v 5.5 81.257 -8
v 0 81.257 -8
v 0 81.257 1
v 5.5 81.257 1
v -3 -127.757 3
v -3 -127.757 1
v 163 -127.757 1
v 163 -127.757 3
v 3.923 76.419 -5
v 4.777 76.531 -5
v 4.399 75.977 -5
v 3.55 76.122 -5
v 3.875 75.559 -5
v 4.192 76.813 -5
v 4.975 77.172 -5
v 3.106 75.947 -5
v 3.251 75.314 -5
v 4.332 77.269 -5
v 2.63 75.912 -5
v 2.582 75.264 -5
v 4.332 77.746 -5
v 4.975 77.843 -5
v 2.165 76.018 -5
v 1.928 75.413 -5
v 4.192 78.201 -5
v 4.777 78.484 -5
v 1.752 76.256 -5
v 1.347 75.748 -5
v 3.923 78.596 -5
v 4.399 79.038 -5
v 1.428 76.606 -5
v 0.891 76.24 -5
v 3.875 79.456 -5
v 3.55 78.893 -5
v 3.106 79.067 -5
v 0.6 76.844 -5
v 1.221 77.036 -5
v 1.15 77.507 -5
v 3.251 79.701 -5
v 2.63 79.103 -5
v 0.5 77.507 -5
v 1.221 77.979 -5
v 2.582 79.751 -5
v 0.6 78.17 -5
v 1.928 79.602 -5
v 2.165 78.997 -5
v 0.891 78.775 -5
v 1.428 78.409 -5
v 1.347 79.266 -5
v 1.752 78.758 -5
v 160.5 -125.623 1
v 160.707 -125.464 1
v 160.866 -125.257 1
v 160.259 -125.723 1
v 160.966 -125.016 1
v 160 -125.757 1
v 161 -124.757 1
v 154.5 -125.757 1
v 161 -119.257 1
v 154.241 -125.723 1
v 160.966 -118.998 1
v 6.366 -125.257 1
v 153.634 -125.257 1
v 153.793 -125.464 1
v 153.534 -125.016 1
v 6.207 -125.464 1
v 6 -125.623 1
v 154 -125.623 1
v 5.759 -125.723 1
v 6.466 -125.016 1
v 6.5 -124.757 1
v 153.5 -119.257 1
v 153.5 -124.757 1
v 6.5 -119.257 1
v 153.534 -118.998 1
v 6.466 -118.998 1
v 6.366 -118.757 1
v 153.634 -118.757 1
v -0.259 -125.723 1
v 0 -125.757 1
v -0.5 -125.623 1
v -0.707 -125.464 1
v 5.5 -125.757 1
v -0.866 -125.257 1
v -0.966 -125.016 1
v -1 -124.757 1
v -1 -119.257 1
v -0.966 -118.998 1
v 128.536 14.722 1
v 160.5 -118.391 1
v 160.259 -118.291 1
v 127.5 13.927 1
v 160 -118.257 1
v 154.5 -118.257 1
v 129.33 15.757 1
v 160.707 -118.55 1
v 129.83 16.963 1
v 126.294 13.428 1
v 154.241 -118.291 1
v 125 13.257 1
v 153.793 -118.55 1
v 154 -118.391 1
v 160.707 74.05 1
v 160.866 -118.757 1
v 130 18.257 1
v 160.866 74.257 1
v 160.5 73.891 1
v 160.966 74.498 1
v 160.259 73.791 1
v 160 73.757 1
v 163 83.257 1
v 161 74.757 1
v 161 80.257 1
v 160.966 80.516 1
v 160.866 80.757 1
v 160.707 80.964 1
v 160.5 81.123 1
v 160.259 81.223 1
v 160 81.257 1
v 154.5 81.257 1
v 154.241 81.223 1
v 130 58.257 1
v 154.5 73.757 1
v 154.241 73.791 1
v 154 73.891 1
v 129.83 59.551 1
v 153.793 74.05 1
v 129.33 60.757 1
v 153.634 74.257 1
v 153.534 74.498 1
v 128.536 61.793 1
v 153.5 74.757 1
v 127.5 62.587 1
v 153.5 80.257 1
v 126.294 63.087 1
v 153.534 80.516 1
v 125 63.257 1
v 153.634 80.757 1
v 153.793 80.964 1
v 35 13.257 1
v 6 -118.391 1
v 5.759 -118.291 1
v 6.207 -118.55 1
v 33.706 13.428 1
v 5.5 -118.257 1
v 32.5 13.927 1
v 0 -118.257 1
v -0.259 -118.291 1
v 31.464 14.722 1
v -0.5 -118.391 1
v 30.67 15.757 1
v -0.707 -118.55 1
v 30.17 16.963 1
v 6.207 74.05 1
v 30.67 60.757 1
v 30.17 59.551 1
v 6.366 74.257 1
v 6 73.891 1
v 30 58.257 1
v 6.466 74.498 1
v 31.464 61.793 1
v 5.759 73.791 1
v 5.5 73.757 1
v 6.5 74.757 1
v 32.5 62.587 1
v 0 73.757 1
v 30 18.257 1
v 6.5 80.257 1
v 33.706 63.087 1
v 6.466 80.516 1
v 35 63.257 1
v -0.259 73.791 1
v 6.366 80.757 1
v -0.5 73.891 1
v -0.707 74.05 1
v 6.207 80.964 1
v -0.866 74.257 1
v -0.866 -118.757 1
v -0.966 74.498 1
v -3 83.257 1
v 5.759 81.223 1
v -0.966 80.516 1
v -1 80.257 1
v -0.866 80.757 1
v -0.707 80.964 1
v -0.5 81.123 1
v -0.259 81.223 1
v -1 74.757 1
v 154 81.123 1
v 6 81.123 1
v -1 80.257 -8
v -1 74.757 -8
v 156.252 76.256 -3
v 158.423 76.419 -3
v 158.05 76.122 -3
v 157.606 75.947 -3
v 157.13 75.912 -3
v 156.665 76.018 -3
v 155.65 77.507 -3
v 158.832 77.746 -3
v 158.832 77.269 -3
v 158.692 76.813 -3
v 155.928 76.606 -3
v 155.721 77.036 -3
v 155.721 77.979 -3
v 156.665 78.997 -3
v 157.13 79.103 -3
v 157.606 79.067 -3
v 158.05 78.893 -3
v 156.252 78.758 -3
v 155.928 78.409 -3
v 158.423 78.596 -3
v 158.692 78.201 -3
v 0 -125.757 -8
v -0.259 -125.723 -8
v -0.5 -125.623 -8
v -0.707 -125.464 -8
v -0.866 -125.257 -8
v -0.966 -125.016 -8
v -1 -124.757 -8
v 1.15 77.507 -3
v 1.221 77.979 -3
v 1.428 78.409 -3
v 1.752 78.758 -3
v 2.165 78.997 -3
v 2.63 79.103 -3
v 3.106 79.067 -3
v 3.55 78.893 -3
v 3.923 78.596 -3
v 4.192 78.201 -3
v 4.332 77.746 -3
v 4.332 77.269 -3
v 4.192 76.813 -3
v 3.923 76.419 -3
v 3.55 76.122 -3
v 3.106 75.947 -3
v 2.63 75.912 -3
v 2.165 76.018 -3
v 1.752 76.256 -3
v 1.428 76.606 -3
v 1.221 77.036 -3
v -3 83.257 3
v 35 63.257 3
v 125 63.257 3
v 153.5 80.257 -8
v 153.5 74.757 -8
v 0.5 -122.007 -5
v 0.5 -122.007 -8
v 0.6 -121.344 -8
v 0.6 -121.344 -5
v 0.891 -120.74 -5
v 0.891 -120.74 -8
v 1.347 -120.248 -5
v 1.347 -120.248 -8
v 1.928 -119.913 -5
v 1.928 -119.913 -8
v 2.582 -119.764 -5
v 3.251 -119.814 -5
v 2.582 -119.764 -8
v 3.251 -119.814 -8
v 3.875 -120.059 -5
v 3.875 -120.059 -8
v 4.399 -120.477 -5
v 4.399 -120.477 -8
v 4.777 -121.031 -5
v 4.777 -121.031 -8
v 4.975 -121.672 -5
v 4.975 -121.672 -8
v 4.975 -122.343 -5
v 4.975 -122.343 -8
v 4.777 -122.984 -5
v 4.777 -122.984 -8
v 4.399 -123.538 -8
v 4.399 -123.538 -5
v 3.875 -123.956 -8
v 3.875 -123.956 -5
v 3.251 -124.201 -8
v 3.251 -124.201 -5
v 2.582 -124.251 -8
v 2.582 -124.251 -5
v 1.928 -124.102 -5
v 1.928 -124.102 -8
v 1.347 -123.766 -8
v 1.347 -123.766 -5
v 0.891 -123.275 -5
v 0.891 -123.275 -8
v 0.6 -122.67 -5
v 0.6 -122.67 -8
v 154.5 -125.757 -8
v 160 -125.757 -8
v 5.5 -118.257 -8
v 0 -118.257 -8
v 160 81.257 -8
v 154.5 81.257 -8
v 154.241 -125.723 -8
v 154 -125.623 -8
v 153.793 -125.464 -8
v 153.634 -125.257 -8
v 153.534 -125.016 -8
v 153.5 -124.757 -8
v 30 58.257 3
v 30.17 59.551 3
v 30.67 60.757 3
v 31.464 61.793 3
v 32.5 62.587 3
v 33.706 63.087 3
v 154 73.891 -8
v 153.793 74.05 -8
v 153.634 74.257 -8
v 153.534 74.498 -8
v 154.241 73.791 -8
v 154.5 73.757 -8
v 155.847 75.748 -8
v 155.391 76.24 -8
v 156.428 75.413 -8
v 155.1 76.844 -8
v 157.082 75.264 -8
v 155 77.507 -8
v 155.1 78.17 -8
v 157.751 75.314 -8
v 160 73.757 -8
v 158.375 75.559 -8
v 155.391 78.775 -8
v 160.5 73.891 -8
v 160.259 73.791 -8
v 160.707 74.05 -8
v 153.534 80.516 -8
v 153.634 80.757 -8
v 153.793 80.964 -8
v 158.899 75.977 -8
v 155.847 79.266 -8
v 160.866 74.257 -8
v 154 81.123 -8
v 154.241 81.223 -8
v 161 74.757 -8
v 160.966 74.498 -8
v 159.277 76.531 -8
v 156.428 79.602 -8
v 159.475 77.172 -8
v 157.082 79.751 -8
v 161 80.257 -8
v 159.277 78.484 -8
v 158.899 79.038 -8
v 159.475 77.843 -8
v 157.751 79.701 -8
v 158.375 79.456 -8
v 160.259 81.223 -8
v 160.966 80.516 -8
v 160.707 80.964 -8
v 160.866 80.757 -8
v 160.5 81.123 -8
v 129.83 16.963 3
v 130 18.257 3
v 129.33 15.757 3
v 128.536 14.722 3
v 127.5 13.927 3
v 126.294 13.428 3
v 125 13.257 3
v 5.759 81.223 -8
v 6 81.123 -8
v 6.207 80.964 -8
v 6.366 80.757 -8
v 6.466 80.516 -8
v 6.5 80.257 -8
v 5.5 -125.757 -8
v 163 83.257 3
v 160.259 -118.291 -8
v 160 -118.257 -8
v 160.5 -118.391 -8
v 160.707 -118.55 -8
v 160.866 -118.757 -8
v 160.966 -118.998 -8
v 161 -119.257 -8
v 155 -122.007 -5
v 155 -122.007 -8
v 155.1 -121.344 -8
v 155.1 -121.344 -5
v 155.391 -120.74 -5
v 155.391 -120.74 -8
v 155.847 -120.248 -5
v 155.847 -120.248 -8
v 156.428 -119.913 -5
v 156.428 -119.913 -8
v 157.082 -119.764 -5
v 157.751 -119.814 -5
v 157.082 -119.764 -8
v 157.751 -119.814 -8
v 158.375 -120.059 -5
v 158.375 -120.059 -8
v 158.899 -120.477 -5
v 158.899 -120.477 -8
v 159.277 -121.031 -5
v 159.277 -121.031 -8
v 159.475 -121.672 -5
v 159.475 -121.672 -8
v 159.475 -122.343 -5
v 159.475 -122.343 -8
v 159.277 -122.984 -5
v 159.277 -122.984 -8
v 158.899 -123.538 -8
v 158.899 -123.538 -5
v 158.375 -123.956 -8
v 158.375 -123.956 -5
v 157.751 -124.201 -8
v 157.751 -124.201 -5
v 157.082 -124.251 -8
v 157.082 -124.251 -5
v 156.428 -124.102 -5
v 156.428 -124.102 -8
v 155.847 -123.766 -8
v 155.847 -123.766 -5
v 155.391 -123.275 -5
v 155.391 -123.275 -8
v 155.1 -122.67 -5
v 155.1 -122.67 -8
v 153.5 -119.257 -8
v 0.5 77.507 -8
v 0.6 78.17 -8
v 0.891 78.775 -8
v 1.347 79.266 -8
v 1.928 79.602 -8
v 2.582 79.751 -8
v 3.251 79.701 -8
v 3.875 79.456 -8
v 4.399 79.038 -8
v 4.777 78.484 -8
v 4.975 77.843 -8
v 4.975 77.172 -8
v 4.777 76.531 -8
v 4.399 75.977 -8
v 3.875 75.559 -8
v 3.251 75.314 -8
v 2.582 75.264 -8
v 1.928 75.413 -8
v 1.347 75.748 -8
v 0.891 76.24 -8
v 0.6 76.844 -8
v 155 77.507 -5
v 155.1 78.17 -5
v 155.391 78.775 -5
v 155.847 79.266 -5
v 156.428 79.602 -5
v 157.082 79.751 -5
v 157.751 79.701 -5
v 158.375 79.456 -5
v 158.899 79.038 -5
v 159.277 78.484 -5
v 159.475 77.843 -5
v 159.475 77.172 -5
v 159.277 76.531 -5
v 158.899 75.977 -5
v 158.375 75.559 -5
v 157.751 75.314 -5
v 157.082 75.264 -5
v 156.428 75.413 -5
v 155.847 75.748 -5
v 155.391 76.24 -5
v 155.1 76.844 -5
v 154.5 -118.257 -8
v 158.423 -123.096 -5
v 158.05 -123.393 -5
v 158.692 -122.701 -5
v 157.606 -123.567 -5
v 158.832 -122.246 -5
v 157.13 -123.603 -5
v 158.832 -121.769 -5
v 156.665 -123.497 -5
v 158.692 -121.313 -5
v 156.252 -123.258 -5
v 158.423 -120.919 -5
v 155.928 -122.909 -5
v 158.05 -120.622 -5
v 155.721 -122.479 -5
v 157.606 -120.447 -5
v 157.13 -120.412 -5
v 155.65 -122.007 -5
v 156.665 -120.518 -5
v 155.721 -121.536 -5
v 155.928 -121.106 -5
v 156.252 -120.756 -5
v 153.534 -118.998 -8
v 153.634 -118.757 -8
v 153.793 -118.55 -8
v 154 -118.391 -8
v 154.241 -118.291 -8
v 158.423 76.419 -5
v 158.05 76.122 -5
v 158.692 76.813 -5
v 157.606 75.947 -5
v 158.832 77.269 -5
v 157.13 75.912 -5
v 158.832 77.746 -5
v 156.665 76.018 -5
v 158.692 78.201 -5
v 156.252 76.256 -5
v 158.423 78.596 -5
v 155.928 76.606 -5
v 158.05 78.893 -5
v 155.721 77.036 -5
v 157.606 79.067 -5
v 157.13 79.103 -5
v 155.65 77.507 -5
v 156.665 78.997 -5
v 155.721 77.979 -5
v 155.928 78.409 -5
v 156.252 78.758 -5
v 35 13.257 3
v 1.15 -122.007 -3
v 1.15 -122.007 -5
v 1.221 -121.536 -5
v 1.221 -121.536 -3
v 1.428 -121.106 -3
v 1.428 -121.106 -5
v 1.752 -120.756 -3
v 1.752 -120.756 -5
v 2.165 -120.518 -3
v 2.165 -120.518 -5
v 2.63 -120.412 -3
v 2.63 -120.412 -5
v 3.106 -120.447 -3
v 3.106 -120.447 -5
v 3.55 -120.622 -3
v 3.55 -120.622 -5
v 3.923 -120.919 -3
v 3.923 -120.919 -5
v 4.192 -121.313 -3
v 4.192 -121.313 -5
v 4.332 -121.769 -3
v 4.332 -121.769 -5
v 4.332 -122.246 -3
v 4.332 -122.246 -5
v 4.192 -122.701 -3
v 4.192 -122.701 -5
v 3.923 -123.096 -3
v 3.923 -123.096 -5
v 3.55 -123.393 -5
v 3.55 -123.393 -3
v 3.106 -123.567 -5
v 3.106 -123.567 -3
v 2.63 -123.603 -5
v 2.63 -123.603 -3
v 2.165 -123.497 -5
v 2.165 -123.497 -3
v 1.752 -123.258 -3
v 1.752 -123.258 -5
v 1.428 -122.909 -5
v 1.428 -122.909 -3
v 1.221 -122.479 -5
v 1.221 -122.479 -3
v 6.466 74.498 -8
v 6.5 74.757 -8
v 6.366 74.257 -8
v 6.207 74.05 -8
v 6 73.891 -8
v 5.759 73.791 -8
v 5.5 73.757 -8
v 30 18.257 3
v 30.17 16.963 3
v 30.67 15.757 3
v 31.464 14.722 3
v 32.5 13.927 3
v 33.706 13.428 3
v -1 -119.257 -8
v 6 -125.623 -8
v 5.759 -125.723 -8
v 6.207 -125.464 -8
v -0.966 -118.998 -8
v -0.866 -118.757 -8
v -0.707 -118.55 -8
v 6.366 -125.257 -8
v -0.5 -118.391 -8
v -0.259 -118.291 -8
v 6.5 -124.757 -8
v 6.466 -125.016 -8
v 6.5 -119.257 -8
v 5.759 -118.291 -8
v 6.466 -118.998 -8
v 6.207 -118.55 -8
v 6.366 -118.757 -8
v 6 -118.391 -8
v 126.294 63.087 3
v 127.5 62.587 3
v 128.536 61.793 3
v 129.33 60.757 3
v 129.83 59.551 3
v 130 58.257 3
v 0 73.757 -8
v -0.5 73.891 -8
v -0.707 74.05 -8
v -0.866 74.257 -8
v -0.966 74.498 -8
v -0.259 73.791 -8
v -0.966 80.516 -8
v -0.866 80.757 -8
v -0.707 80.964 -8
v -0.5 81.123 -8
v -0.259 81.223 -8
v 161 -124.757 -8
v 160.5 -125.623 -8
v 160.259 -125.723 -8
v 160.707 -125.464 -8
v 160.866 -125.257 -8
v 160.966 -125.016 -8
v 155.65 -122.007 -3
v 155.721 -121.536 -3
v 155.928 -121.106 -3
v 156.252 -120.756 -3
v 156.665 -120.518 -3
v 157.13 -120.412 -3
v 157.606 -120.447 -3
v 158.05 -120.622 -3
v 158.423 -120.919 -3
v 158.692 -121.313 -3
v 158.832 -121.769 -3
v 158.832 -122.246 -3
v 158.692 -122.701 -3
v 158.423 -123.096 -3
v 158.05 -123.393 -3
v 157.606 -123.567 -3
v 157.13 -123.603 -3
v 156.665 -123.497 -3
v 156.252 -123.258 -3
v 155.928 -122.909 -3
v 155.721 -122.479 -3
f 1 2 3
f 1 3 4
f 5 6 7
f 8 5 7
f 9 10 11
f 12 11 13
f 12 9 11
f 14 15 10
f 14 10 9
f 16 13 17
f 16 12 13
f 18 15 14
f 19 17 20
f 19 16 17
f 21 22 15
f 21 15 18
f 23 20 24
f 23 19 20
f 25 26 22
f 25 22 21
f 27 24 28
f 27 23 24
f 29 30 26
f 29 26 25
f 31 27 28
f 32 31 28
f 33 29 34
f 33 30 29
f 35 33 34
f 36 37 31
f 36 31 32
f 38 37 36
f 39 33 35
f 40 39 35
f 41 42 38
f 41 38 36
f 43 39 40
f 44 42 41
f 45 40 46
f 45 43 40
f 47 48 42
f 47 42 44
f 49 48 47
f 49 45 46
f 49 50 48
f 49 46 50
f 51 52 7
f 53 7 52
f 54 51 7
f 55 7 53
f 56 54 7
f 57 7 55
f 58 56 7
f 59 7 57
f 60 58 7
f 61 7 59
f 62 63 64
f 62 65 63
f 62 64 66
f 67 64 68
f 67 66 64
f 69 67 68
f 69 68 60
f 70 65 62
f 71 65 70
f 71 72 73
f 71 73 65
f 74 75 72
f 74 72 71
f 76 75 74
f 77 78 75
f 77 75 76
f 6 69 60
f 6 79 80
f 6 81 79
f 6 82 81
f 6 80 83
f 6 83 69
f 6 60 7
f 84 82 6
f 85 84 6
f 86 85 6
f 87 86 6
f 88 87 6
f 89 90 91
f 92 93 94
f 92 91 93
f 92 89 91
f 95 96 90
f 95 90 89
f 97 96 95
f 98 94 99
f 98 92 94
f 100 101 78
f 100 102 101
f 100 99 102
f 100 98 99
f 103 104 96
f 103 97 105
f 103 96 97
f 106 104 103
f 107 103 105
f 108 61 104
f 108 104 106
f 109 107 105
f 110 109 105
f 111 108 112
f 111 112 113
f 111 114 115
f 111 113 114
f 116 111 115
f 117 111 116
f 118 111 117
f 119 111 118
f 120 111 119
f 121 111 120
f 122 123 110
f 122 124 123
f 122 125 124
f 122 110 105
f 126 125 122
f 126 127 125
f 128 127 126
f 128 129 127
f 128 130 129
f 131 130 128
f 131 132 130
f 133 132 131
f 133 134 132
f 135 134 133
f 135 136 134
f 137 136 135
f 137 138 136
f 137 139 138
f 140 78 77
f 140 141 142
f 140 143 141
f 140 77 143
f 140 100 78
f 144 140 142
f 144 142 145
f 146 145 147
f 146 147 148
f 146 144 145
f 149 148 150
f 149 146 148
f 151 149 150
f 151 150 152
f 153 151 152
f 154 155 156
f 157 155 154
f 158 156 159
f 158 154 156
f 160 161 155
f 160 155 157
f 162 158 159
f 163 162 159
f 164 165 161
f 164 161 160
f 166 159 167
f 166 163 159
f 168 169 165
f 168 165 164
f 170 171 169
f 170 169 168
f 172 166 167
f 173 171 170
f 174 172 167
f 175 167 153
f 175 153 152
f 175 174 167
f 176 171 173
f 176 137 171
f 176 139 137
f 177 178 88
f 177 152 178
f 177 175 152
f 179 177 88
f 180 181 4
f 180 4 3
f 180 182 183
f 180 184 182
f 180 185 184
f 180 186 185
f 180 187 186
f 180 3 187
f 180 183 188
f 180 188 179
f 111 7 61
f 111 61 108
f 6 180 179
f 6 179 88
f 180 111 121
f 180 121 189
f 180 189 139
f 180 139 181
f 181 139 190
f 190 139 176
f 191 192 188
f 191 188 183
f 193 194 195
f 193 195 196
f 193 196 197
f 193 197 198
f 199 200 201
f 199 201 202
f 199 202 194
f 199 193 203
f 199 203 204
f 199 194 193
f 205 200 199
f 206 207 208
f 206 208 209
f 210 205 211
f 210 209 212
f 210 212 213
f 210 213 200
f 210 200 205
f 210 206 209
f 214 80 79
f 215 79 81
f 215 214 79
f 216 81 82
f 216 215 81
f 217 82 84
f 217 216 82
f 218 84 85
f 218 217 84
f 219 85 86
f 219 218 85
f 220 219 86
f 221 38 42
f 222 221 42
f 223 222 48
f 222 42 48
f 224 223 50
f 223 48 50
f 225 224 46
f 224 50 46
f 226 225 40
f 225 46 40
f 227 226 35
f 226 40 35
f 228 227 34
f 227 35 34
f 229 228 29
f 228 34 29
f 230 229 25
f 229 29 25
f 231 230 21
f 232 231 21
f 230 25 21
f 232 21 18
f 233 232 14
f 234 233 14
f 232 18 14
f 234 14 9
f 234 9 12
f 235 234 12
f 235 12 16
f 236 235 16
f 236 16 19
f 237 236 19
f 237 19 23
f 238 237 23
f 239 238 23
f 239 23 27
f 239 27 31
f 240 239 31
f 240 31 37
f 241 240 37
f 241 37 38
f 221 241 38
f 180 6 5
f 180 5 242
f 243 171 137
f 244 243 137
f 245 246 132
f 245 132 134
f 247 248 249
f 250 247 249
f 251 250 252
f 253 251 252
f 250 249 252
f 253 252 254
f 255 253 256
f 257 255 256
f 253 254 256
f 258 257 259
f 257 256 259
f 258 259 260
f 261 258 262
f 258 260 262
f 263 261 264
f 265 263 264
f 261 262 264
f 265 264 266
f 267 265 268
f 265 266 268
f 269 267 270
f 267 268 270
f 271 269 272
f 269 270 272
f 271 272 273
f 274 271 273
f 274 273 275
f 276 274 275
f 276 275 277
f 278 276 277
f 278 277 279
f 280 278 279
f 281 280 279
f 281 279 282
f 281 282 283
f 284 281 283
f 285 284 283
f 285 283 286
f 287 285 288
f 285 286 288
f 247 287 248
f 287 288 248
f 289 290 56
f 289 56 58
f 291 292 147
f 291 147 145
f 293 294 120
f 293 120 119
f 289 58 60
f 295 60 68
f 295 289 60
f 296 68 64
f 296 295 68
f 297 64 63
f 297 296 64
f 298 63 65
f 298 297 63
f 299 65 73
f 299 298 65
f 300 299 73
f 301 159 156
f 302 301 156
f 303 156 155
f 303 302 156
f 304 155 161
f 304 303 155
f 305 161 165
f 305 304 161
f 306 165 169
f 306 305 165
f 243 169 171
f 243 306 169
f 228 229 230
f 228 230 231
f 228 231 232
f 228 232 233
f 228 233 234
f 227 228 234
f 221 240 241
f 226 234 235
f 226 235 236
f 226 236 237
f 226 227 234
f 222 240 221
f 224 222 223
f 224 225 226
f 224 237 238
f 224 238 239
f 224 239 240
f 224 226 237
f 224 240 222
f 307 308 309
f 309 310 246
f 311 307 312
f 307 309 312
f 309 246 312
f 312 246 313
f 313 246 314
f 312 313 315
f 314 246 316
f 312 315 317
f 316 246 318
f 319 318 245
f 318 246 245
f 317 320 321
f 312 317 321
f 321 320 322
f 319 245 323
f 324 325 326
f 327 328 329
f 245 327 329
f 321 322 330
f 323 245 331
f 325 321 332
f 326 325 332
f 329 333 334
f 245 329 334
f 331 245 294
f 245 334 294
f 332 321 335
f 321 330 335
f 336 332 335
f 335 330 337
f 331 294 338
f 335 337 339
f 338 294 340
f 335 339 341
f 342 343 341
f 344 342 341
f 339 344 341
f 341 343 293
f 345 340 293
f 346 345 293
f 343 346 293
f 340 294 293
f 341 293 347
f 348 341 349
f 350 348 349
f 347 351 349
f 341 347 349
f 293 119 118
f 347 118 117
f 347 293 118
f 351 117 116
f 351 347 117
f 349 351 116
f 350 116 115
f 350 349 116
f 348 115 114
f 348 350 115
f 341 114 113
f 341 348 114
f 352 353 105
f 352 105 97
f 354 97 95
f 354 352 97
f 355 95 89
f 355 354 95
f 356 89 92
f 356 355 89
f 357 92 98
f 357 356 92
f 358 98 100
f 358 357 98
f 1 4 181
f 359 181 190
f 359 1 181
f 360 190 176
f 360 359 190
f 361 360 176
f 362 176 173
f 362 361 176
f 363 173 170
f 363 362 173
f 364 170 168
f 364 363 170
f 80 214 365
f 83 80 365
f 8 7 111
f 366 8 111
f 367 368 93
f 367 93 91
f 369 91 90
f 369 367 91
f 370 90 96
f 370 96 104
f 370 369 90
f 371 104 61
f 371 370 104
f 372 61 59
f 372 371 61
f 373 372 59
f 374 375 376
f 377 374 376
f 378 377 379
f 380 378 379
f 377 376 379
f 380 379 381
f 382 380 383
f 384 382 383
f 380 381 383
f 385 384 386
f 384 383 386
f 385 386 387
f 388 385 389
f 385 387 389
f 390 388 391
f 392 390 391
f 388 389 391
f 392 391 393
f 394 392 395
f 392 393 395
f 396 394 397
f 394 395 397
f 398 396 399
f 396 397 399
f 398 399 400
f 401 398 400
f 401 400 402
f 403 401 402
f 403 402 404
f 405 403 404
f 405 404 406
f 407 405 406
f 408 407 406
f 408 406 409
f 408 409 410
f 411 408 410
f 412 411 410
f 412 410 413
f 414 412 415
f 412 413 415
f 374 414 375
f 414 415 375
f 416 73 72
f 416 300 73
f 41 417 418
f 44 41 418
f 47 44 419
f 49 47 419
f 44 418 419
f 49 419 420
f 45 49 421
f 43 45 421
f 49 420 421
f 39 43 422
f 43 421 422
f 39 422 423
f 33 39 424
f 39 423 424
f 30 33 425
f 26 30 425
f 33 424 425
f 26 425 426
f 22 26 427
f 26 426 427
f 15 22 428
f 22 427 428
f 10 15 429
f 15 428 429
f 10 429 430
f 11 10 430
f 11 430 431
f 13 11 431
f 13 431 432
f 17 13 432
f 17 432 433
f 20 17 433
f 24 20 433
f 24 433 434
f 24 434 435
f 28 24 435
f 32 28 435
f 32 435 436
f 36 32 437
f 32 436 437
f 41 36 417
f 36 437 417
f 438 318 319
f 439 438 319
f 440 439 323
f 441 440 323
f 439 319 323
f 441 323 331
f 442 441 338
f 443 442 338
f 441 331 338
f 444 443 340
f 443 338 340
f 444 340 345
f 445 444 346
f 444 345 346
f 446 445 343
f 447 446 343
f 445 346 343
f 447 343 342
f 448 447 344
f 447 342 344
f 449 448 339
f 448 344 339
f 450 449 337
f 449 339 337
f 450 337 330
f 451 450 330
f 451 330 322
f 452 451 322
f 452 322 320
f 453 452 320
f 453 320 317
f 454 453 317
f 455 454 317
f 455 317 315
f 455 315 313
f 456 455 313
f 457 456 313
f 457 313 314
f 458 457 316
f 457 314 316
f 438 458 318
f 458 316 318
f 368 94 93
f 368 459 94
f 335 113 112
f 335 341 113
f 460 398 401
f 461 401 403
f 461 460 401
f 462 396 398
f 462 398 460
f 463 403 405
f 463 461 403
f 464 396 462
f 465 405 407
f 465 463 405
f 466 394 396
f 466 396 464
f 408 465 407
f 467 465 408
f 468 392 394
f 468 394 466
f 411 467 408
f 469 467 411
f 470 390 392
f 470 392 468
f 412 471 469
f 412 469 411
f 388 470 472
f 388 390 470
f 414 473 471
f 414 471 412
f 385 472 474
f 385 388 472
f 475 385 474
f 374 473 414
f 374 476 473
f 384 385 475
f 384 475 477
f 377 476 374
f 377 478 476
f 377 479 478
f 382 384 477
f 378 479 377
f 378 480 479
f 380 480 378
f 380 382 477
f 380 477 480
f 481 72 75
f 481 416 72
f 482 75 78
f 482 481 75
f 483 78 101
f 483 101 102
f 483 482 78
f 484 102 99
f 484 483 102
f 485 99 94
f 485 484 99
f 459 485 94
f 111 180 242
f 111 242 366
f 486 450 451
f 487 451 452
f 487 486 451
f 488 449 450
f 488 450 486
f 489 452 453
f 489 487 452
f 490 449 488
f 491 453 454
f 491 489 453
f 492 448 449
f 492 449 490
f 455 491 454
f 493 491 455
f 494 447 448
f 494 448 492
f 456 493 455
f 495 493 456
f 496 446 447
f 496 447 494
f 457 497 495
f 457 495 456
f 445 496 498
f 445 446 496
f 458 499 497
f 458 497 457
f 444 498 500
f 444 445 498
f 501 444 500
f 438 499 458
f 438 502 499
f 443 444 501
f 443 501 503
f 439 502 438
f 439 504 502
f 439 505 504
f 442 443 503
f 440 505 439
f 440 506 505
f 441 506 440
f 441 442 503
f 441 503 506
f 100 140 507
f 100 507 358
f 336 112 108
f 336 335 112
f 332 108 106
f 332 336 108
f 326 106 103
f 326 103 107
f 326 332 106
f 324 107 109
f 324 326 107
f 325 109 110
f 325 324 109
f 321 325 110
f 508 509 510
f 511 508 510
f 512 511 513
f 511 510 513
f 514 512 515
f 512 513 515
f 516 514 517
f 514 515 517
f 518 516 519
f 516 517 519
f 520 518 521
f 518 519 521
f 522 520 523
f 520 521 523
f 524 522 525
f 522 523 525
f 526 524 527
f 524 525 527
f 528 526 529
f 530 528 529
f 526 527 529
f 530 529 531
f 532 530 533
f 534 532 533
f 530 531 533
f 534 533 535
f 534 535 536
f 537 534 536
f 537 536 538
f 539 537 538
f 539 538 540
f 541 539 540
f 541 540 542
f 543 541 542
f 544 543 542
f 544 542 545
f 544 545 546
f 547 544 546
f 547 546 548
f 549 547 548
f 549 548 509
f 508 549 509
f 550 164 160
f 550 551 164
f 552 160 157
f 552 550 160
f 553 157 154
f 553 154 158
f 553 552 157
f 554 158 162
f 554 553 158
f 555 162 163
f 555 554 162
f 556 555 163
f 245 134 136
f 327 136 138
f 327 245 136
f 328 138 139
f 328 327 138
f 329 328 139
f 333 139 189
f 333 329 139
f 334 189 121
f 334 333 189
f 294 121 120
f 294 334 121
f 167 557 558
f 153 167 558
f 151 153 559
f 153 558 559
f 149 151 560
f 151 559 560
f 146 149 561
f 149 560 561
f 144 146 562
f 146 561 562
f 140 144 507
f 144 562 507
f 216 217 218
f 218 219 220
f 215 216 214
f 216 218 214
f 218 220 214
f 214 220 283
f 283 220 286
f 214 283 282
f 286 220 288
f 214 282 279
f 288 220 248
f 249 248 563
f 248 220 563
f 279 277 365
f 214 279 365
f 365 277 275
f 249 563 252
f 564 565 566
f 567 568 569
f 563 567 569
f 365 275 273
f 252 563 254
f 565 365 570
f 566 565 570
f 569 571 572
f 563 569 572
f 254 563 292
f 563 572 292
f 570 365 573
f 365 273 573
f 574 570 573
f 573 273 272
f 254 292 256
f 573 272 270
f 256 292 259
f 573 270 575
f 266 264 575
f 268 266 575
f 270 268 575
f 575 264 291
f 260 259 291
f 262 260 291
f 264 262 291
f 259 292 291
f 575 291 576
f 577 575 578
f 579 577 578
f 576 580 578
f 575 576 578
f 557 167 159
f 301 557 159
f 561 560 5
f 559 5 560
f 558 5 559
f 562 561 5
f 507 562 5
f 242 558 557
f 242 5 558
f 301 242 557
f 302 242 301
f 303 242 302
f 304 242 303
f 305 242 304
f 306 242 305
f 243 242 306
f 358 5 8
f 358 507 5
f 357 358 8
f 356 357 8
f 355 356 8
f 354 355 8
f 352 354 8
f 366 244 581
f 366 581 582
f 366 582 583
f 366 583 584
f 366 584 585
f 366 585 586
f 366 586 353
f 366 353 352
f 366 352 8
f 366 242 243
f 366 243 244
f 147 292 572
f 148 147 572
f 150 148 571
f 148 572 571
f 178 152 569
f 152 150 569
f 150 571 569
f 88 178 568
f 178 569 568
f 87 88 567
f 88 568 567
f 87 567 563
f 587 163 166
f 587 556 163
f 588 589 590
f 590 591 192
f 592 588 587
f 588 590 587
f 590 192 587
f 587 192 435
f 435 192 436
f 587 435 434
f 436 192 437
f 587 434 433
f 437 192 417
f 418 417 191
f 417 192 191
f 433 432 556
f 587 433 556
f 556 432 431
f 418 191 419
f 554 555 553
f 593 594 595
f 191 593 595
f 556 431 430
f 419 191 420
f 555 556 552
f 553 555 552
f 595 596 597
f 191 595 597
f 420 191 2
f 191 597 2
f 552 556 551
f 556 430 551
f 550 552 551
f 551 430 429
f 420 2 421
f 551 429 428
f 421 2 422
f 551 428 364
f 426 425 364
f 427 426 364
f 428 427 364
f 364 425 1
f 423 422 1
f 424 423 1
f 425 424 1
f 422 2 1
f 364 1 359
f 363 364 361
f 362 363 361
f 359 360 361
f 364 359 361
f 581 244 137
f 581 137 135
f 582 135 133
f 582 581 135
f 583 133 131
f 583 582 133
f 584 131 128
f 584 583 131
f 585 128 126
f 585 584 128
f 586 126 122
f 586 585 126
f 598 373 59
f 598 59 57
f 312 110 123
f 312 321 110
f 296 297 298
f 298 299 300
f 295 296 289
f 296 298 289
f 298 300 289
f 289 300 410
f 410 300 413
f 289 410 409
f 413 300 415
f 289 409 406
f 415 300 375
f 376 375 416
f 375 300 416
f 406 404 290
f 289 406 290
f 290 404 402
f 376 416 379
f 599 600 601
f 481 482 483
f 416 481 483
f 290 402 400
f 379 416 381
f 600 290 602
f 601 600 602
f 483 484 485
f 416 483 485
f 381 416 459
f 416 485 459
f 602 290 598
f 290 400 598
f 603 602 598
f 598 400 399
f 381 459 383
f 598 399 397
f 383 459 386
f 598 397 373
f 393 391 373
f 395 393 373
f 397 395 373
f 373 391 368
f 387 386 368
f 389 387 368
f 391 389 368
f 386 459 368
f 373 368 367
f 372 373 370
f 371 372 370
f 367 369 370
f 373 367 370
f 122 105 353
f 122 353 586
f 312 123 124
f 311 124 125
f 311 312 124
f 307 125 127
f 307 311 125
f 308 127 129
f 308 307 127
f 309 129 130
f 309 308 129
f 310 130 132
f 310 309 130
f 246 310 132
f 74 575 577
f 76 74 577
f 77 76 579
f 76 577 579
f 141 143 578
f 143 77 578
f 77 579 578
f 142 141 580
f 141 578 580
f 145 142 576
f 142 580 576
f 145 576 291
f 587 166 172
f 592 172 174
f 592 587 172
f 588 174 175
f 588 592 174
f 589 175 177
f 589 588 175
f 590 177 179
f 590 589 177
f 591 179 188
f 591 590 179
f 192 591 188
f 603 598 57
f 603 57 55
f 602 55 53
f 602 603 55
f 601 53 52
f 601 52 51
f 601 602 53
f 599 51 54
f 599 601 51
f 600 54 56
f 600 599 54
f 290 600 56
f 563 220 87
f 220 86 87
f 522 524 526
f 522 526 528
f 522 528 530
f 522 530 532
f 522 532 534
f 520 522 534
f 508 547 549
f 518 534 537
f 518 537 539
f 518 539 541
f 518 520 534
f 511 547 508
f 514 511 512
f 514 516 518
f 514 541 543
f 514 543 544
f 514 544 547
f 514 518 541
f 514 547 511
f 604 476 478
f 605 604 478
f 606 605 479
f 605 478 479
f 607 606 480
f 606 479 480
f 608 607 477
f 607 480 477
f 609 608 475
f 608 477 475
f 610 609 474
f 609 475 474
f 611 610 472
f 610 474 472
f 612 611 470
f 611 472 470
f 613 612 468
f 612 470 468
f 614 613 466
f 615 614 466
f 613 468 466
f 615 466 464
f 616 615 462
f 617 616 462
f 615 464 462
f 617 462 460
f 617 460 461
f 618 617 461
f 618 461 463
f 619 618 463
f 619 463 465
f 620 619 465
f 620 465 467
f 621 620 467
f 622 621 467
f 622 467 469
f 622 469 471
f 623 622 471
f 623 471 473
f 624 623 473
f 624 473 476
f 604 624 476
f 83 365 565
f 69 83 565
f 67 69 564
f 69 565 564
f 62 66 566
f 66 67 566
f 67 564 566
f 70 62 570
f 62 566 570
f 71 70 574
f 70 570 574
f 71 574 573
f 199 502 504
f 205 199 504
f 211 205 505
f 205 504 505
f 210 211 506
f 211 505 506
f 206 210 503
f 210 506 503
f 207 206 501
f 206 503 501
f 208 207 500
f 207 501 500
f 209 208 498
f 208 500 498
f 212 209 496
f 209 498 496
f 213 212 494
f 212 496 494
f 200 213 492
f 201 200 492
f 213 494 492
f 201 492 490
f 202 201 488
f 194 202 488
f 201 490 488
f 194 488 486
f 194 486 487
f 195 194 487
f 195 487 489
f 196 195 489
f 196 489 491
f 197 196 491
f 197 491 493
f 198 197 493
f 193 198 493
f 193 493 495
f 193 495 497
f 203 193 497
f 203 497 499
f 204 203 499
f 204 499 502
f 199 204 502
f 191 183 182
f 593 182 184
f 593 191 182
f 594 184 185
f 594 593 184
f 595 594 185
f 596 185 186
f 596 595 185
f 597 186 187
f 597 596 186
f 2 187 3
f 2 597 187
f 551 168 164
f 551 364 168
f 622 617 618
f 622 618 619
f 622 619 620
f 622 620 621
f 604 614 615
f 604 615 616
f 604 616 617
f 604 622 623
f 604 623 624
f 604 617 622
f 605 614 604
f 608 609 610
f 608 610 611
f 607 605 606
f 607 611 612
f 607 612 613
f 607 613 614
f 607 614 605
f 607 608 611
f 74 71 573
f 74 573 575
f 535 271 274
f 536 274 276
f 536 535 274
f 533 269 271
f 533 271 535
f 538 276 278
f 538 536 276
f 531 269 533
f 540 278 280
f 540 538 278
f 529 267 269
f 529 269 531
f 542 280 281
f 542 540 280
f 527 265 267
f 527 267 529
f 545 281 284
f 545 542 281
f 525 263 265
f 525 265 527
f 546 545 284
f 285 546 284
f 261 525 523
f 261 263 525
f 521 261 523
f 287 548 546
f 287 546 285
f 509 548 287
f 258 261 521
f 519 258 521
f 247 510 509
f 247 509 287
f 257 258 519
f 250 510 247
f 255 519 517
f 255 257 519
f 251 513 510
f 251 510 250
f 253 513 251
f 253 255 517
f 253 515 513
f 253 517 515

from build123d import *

# Parameters (mm, degrees)
BOSS_EXTRUDE1_DEPTH = 3
SKETCH2_W           = 166
SKETCH2_H           = 211.014567036
SKETCH2_W_2         = 100
SKETCH2_H_2         = 50
BOSS_EXTRUDE2_DEPTH = 3
CUT_EXTRUDE1_DEPTH  = 3
FILLET1_R           = 5
SKETCH4_W           = 7.5
SKETCH4_H           = 7.5
BOSS_EXTRUDE3_DEPTH = 11
FILLET2_R           = 1
SKETCH5_R           = 1.6
CUT_EXTRUDE2_DEPTH  = 5
SKETCH6_R           = 2.25
CUT_EXTRUDE3_DEPTH  = 3
SKETCH7_W           = 166
SKETCH7_H           = 211.014567036
CUT_EXTRUDE4_DEPTH  = 1


with BuildPart() as part:
    # Sketch1 → Boss-Extrude1 (new body)
    with BuildSketch(Plane.XY):
        with BuildLine():
            Line((48, 73.257283518), (48, -16.742716482))
            ThreePointArc((48, -16.742716482), (50.050252532, -21.69246395), (55, -23.742716482))
            Line((55, -23.742716482), (105, -23.742716482))
            ThreePointArc((105, -23.742716482), (109.949747468, -21.69246395), (112, -16.742716482))
            Line((112, -16.742716482), (112, 73.257283518))
            ThreePointArc((112, 73.257283518), (109.949747468, 78.207030987), (105, 80.257283518))
            Line((105, 80.257283518), (55, 80.257283518))
            ThreePointArc((55, 80.257283518), (50.050252532, 78.207030987), (48, 73.257283518))
        make_face()
        with BuildLine():
            Line((53, 73.257283518), (53, -16.742716482))
            ThreePointArc((53, -16.742716482), (53.585786438, -18.156930044), (55, -18.742716482))
            Line((55, -18.742716482), (105, -18.742716482))
            ThreePointArc((105, -18.742716482), (106.414213562, -18.156930044), (107, -16.742716482))
            Line((107, -16.742716482), (107, 73.257283518))
            ThreePointArc((107, 73.257283518), (106.414213562, 74.671497081), (105, 75.257283518))
            Line((105, 75.257283518), (55, 75.257283518))
            ThreePointArc((55, 75.257283518), (53.585786438, 74.671497081), (53, 73.257283518))
        make_face(mode=Mode.SUBTRACT)
    extrude(amount=-BOSS_EXTRUDE1_DEPTH)

    # Sketch2 → Boss-Extrude2 (add)
    with BuildSketch(Plane.XY):
        with Locations((80, -22.25)):
            Rectangle(SKETCH2_W, SKETCH2_H)
        with Locations((80, 38.257283518)):
            Rectangle(SKETCH2_W_2, SKETCH2_H_2, mode=Mode.SUBTRACT)
    extrude(amount=BOSS_EXTRUDE2_DEPTH)

    # Sketch3 → Cut-Extrude1 (cut)
    with BuildSketch(Plane(origin=(0, 0, -3), x_dir=(-1, 0, 0), z_dir=(0, 0, -1))):
        with BuildLine():
            Line((-55, 80.257283518), (-105, 80.257283518))
            ThreePointArc((-105, 80.257283518), (-109.949747468, 78.207030987), (-112, 73.257283518))
            Line((-112, 73.257283518), (-112, -16.742716482))
            ThreePointArc((-112, -16.742716482), (-109.949747468, -21.69246395), (-105, -23.742716482))
            Line((-105, -23.742716482), (-55, -23.742716482))
            ThreePointArc((-55, -23.742716482), (-50.050252532, -21.69246395), (-48, -16.742716482))
            Line((-48, -16.742716482), (-48, 73.257283518))
            ThreePointArc((-48, 73.257283518), (-50.050252532, 78.207030987), (-55, 80.257283518))
        make_face()
    extrude(amount=-CUT_EXTRUDE1_DEPTH, mode=Mode.SUBTRACT)

    # Fillet1
    fillet1_edges = [part.edges().sort_by_distance(p)[0] for p in [
        (30, 13.257283518, 1.5),
        (130, 13.257283518, 1.5),
        (130, 63.257283518, 1.5),
        (30, 63.257283518, 1.5),
    ]]
    fillet(fillet1_edges, radius=FILLET1_R)

    # Sketch4 → Boss-Extrude3 (add)
    with BuildSketch(Plane.XY.offset(3)):
        with Locations((2.75, 77.507283518)):
            Rectangle(SKETCH4_W, SKETCH4_H)
        with Locations((157.25, -122.007283518)):
            Rectangle(SKETCH4_W, SKETCH4_H)
        with Locations((2.75, -122.007283518)):
            Rectangle(SKETCH4_W, SKETCH4_H)
        with Locations((157.25, 77.507283518)):
            Rectangle(SKETCH4_W, SKETCH4_H)
    extrude(amount=-BOSS_EXTRUDE3_DEPTH)

    # Fillet2
    fillet2_edges = [part.edges().sort_by_distance(p)[0] for p in [
        (-1, 73.757283518, -4),
        (-1, 81.257283518, -4),
        (6.5, 81.257283518, -4),
        (6.5, 73.757283518, -4),
        (161, -118.257283518, -4),
        (161, -125.757283518, -4),
        (153.5, -125.757283518, -4),
        (153.5, -118.257283518, -4),
        (-1, -125.757283518, -4),
        (-1, -118.257283518, -4),
        (6.5, -118.257283518, -4),
        (6.5, -125.757283518, -4),
        (161, 81.257283518, -4),
        (161, 73.757283518, -4),
        (153.5, 73.757283518, -4),
        (153.5, 81.257283518, -4),
    ]]
    fillet(fillet2_edges, radius=FILLET2_R)

    # Sketch5 → Cut-Extrude2 (cut)
    with BuildSketch(Plane(origin=(0, 0, -8), x_dir=(-1, 0, 0), z_dir=(0, 0, -1))):
        with Locations((-157.25, 77.507283518)):
            Circle(SKETCH5_R)
        with Locations((-2.75, 77.507283518)):
            Circle(SKETCH5_R)
        with Locations((-2.75, -122.007283518)):
            Circle(SKETCH5_R)
        with Locations((-157.25, -122.007283518)):
            Circle(SKETCH5_R)
    extrude(amount=-CUT_EXTRUDE2_DEPTH, mode=Mode.SUBTRACT)

    # Sketch6 → Cut-Extrude3 (cut)
    with BuildSketch(Plane(origin=(0, 0, -8), x_dir=(-1, 0, 0), z_dir=(0, 0, -1))):
        with Locations((-157.25, 77.507283518)):
            Circle(SKETCH6_R)
        with Locations((-2.75, 77.507283518)):
            Circle(SKETCH6_R)
        with Locations((-157.25, -122.007283518)):
            Circle(SKETCH6_R)
        with Locations((-2.75, -122.007283518)):
            Circle(SKETCH6_R)
    extrude(amount=-CUT_EXTRUDE3_DEPTH, mode=Mode.SUBTRACT)

    # Sketch7 → Cut-Extrude4 (cut)
    with BuildSketch(Plane(origin=(0, 0, 0), x_dir=(-1, 0, 0), z_dir=(0, 0, -1))):
        with Locations((-80, -22.25)):
            Rectangle(SKETCH7_W, SKETCH7_H)
        with BuildLine():
            Line((-160, 73.757283518), (-154.5, 73.757283518))
            ThreePointArc((-154.5, 73.757283518), (-153.792893219, 74.050176737), (-153.5, 74.757283518))
            Line((-153.5, 74.757283518), (-153.5, 80.257283518))
            ThreePointArc((-153.5, 80.257283518), (-153.792893219, 80.9643903), (-154.5, 81.257283518))
            Line((-154.5, 81.257283518), (-160, 81.257283518))
            ThreePointArc((-160, 81.257283518), (-160.707106781, 80.9643903), (-161, 80.257283518))
            Line((-161, 80.257283518), (-161, 74.757283518))
            ThreePointArc((-161, 74.757283518), (-160.707106781, 74.050176737), (-160, 73.757283518))
        make_face(mode=Mode.SUBTRACT)
        with BuildLine():
            Line((-5.5, 73.757283518), (0, 73.757283518))
            ThreePointArc((0, 73.757283518), (0.707106781, 74.050176737), (1, 74.757283518))
            Line((1, 74.757283518), (1, 80.257283518))
            ThreePointArc((1, 80.257283518), (0.707106781, 80.9643903), (0, 81.257283518))
            Line((0, 81.257283518), (-5.5, 81.257283518))
            ThreePointArc((-5.5, 81.257283518), (-6.207106781, 80.9643903), (-6.5, 80.257283518))
            Line((-6.5, 80.257283518), (-6.5, 74.757283518))
            ThreePointArc((-6.5, 74.757283518), (-6.207106781, 74.050176737), (-5.5, 73.757283518))
        make_face(mode=Mode.SUBTRACT)
        with BuildLine():
            Line((-154.5, -118.257283518), (-160, -118.257283518))
            ThreePointArc((-160, -118.257283518), (-160.707106781, -118.550176737), (-161, -119.257283518))
            Line((-161, -119.257283518), (-161, -124.757283518))
            ThreePointArc((-161, -124.757283518), (-160.707106781, -125.464390299), (-160, -125.757283518))
            Line((-160, -125.757283518), (-154.5, -125.757283518))
            ThreePointArc((-154.5, -125.757283518), (-153.792893219, -125.464390299), (-153.5, -124.757283518))
            Line((-153.5, -124.757283518), (-153.5, -119.257283518))
            ThreePointArc((-153.5, -119.257283518), (-153.792893219, -118.550176737), (-154.5, -118.257283518))
        make_face(mode=Mode.SUBTRACT)
        with BuildLine():
            Line((-6.5, -119.257283518), (-6.5, -124.757283518))
            ThreePointArc((-6.5, -124.757283518), (-6.207106781, -125.464390299), (-5.5, -125.757283518))
            Line((-5.5, -125.757283518), (0, -125.757283518))
            ThreePointArc((0, -125.757283518), (0.707106781, -125.464390299), (1, -124.757283518))
            Line((1, -124.757283518), (1, -119.257283518))
            ThreePointArc((1, -119.257283518), (0.707106781, -118.550176737), (0, -118.257283518))
            Line((0, -118.257283518), (-5.5, -118.257283518))
            ThreePointArc((-5.5, -118.257283518), (-6.207106781, -118.550176737), (-6.5, -119.257283518))
        make_face(mode=Mode.SUBTRACT)
    extrude(amount=-CUT_EXTRUDE4_DEPTH, mode=Mode.SUBTRACT)


solid = part.part
